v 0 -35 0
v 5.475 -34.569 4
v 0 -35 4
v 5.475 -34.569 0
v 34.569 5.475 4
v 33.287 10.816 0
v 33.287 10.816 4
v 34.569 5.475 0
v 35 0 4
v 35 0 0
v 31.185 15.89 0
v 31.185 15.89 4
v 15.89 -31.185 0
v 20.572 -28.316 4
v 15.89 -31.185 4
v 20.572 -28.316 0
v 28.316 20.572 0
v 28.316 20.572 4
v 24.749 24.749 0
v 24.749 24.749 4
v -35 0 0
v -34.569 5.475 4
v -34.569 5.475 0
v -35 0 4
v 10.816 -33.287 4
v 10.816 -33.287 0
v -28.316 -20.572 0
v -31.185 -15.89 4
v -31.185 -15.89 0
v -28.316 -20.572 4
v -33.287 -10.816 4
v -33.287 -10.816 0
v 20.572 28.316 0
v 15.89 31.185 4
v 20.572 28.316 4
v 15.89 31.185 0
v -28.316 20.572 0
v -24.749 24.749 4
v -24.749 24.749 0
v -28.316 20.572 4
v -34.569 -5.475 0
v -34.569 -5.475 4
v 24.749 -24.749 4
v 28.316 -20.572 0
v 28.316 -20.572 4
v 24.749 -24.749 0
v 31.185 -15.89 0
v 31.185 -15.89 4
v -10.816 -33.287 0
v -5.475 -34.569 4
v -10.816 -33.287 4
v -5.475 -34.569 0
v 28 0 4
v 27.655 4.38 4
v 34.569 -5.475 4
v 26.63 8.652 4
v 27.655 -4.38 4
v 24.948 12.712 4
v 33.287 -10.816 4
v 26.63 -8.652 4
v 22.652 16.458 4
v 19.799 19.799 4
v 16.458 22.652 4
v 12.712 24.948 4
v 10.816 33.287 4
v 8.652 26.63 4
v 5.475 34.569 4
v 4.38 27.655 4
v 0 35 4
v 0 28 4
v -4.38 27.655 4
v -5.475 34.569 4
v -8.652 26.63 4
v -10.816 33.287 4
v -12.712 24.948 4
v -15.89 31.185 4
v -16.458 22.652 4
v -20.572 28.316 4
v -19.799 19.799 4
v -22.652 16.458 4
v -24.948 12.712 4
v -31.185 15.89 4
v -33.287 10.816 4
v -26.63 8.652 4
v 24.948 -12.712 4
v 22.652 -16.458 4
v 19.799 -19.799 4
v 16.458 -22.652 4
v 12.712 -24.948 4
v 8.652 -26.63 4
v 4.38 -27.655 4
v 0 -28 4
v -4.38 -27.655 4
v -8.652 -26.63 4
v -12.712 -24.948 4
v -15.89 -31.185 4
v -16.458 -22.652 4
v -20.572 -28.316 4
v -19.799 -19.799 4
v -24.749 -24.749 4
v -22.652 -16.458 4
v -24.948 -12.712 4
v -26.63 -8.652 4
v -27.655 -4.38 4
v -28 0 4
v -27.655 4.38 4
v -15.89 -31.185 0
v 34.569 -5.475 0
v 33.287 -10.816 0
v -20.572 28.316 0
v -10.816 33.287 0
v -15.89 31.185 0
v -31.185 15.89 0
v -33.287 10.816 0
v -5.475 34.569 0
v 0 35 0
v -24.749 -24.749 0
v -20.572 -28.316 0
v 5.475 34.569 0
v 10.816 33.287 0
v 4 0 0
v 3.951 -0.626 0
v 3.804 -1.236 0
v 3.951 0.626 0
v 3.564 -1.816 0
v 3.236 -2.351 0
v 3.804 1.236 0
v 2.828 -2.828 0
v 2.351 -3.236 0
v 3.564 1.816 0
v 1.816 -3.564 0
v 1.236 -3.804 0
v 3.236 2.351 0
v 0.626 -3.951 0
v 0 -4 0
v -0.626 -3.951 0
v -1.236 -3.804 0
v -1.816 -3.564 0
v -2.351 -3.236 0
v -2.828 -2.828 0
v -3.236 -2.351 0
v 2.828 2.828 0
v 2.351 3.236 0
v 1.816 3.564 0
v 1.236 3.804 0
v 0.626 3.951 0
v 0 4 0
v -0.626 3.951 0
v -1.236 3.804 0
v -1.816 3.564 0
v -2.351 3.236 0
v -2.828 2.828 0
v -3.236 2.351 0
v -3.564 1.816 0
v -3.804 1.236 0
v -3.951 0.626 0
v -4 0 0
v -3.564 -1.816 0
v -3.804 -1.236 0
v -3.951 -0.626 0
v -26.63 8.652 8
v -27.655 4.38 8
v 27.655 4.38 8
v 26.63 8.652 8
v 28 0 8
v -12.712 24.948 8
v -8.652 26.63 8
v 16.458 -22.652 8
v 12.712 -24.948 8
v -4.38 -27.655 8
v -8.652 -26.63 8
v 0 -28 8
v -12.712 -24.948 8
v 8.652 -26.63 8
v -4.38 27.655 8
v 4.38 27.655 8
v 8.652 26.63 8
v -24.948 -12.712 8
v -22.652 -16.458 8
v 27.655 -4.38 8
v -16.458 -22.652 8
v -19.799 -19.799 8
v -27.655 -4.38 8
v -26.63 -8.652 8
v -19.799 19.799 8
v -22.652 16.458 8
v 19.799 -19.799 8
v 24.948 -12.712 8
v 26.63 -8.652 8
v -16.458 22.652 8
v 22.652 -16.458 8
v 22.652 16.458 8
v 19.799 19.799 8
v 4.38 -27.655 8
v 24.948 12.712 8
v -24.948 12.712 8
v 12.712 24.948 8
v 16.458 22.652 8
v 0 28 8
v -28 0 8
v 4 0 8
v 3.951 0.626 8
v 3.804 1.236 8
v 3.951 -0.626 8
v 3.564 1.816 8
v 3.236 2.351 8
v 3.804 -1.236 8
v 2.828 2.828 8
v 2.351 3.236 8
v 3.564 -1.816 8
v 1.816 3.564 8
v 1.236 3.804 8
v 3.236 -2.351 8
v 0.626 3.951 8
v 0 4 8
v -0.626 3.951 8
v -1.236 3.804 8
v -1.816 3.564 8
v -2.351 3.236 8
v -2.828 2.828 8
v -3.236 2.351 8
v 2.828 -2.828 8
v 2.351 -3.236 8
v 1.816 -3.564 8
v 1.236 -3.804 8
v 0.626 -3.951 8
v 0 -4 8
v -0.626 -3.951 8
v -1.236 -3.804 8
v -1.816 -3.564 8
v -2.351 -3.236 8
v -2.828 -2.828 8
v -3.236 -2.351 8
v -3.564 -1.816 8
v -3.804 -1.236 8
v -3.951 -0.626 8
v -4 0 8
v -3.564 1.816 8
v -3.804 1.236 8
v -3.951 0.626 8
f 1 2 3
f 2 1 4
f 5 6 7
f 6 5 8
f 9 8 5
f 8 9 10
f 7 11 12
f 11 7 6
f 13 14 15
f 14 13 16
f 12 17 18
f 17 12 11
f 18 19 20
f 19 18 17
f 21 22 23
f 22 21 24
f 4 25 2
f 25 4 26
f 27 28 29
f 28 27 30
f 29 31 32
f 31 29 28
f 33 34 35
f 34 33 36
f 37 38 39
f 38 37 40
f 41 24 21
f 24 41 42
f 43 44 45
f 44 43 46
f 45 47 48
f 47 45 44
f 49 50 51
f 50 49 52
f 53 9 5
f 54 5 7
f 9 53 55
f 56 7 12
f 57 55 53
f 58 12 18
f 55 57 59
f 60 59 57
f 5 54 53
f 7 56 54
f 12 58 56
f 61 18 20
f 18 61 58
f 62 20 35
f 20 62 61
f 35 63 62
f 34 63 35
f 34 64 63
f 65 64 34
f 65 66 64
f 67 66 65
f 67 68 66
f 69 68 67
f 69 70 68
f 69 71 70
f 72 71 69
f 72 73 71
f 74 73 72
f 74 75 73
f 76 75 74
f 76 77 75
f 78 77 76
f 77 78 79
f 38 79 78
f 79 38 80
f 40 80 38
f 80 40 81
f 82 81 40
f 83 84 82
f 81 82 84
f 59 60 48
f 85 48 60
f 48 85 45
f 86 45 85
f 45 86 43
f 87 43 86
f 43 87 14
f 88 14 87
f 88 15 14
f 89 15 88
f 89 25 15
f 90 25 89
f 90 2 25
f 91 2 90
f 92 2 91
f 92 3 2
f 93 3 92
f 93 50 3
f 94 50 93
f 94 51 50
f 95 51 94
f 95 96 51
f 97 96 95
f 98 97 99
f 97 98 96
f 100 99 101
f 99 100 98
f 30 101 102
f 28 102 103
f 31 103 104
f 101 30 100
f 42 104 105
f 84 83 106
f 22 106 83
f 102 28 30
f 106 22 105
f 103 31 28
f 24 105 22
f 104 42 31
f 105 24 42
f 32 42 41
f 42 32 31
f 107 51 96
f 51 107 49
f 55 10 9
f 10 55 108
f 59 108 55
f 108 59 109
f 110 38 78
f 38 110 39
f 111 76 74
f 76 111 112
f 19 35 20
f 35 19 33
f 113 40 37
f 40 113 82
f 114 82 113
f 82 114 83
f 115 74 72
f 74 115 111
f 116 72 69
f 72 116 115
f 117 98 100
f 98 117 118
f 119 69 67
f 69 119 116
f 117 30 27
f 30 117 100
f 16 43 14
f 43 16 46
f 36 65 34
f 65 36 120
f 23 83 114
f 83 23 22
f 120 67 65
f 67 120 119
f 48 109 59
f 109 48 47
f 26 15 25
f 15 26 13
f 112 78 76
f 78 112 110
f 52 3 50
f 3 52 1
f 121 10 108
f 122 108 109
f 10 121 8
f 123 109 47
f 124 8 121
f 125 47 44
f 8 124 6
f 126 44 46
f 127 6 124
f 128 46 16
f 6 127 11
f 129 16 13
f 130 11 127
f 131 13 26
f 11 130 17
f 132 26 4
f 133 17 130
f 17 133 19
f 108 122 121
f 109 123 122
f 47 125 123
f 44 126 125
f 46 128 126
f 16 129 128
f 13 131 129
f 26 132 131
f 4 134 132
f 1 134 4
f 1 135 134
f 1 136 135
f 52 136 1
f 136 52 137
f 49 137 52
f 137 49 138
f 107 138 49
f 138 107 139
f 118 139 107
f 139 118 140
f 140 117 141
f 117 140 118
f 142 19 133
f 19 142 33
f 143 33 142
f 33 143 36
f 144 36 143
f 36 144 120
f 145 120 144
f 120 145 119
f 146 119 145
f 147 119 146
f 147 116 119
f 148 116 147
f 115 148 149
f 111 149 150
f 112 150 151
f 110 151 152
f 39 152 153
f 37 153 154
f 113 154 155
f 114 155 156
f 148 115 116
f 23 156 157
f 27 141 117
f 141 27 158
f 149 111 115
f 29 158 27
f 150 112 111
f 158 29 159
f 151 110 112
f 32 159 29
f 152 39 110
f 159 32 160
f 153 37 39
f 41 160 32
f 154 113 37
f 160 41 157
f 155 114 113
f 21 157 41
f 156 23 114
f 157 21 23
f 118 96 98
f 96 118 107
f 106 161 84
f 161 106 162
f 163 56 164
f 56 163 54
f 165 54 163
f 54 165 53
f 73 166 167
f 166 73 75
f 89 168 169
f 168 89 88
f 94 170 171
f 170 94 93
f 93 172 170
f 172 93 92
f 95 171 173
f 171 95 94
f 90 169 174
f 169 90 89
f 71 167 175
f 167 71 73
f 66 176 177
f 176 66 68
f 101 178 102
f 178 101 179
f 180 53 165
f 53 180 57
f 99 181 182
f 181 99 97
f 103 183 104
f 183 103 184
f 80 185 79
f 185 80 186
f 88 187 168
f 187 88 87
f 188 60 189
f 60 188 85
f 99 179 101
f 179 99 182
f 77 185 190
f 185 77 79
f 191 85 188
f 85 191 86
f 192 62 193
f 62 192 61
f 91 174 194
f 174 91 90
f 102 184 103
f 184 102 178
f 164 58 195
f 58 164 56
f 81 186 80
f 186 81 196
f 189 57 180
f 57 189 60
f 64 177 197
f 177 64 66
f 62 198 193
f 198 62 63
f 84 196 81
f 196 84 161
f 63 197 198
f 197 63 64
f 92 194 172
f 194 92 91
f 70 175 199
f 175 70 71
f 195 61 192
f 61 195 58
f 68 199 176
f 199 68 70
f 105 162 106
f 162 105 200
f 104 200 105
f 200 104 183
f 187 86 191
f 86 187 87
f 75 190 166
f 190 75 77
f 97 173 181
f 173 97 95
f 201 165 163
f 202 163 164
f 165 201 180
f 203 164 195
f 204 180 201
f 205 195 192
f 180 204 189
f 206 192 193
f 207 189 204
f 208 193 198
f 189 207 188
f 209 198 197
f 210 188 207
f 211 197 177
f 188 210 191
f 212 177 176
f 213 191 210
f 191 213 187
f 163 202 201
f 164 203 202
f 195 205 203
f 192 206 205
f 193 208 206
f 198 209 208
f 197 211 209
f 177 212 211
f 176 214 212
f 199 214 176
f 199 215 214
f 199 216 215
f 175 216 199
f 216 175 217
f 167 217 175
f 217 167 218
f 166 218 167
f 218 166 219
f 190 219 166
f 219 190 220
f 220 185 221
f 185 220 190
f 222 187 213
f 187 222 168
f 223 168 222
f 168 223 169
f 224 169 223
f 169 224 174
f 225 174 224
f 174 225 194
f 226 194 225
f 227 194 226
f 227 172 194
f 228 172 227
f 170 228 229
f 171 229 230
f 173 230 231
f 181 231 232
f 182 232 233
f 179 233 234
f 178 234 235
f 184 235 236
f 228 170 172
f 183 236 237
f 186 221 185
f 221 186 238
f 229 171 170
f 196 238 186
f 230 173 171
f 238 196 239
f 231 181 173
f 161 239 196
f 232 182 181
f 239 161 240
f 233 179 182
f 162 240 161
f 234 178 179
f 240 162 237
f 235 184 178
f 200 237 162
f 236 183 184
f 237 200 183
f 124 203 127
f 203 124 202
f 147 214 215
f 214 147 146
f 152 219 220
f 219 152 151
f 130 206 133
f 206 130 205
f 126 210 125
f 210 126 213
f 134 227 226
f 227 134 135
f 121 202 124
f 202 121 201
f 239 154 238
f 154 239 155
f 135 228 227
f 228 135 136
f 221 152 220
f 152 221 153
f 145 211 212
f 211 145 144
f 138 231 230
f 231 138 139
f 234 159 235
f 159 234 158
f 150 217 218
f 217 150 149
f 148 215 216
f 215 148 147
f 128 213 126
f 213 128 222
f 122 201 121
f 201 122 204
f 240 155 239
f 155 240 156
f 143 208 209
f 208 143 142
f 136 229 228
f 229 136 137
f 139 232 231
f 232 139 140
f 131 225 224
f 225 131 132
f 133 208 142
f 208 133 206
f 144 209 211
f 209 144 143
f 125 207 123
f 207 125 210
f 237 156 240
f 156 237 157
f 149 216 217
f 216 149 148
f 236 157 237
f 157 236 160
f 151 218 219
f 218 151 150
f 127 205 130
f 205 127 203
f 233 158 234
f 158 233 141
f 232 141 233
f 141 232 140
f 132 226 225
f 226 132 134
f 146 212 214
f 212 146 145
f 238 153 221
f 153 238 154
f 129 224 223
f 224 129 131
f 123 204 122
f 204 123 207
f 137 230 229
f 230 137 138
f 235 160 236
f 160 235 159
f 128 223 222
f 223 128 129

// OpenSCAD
//filament holder spindle
//Rick Fray, 3/5/2016

/******** USER VARIABLES ************/
/* Outer hub radius */
outer_radius = 35; // [outer_radius must be > than inner_radius]

/* Inner hub radius - the part that fits in filament reel hole */
inner_radius = 28; // [inner_radius must be < than outer_radius. 28 is close for 1KG reel; 16 for Sainsmart .8kg reel] 

/* Spindle bolt hole radius - 1/4" bolt would be 4 mm */
bolt_radius = 4;

/* Outer hub thickness */
outer_thickness = 4; //outer_thickness must be less than inner_thickness

/* Inner hub thickness */
inner_thickness = 8; //inner_thickness must be less than outer_thickness

difference(){
union(){
cylinder(outer_thickness,outer_radius,outer_radius,$fn=40);
cylinder(inner_thickness,inner_radius,inner_radius,$fn=40);
    }
cylinder (inner_thickness,bolt_radius,bolt_radius,$fn=40);
}
